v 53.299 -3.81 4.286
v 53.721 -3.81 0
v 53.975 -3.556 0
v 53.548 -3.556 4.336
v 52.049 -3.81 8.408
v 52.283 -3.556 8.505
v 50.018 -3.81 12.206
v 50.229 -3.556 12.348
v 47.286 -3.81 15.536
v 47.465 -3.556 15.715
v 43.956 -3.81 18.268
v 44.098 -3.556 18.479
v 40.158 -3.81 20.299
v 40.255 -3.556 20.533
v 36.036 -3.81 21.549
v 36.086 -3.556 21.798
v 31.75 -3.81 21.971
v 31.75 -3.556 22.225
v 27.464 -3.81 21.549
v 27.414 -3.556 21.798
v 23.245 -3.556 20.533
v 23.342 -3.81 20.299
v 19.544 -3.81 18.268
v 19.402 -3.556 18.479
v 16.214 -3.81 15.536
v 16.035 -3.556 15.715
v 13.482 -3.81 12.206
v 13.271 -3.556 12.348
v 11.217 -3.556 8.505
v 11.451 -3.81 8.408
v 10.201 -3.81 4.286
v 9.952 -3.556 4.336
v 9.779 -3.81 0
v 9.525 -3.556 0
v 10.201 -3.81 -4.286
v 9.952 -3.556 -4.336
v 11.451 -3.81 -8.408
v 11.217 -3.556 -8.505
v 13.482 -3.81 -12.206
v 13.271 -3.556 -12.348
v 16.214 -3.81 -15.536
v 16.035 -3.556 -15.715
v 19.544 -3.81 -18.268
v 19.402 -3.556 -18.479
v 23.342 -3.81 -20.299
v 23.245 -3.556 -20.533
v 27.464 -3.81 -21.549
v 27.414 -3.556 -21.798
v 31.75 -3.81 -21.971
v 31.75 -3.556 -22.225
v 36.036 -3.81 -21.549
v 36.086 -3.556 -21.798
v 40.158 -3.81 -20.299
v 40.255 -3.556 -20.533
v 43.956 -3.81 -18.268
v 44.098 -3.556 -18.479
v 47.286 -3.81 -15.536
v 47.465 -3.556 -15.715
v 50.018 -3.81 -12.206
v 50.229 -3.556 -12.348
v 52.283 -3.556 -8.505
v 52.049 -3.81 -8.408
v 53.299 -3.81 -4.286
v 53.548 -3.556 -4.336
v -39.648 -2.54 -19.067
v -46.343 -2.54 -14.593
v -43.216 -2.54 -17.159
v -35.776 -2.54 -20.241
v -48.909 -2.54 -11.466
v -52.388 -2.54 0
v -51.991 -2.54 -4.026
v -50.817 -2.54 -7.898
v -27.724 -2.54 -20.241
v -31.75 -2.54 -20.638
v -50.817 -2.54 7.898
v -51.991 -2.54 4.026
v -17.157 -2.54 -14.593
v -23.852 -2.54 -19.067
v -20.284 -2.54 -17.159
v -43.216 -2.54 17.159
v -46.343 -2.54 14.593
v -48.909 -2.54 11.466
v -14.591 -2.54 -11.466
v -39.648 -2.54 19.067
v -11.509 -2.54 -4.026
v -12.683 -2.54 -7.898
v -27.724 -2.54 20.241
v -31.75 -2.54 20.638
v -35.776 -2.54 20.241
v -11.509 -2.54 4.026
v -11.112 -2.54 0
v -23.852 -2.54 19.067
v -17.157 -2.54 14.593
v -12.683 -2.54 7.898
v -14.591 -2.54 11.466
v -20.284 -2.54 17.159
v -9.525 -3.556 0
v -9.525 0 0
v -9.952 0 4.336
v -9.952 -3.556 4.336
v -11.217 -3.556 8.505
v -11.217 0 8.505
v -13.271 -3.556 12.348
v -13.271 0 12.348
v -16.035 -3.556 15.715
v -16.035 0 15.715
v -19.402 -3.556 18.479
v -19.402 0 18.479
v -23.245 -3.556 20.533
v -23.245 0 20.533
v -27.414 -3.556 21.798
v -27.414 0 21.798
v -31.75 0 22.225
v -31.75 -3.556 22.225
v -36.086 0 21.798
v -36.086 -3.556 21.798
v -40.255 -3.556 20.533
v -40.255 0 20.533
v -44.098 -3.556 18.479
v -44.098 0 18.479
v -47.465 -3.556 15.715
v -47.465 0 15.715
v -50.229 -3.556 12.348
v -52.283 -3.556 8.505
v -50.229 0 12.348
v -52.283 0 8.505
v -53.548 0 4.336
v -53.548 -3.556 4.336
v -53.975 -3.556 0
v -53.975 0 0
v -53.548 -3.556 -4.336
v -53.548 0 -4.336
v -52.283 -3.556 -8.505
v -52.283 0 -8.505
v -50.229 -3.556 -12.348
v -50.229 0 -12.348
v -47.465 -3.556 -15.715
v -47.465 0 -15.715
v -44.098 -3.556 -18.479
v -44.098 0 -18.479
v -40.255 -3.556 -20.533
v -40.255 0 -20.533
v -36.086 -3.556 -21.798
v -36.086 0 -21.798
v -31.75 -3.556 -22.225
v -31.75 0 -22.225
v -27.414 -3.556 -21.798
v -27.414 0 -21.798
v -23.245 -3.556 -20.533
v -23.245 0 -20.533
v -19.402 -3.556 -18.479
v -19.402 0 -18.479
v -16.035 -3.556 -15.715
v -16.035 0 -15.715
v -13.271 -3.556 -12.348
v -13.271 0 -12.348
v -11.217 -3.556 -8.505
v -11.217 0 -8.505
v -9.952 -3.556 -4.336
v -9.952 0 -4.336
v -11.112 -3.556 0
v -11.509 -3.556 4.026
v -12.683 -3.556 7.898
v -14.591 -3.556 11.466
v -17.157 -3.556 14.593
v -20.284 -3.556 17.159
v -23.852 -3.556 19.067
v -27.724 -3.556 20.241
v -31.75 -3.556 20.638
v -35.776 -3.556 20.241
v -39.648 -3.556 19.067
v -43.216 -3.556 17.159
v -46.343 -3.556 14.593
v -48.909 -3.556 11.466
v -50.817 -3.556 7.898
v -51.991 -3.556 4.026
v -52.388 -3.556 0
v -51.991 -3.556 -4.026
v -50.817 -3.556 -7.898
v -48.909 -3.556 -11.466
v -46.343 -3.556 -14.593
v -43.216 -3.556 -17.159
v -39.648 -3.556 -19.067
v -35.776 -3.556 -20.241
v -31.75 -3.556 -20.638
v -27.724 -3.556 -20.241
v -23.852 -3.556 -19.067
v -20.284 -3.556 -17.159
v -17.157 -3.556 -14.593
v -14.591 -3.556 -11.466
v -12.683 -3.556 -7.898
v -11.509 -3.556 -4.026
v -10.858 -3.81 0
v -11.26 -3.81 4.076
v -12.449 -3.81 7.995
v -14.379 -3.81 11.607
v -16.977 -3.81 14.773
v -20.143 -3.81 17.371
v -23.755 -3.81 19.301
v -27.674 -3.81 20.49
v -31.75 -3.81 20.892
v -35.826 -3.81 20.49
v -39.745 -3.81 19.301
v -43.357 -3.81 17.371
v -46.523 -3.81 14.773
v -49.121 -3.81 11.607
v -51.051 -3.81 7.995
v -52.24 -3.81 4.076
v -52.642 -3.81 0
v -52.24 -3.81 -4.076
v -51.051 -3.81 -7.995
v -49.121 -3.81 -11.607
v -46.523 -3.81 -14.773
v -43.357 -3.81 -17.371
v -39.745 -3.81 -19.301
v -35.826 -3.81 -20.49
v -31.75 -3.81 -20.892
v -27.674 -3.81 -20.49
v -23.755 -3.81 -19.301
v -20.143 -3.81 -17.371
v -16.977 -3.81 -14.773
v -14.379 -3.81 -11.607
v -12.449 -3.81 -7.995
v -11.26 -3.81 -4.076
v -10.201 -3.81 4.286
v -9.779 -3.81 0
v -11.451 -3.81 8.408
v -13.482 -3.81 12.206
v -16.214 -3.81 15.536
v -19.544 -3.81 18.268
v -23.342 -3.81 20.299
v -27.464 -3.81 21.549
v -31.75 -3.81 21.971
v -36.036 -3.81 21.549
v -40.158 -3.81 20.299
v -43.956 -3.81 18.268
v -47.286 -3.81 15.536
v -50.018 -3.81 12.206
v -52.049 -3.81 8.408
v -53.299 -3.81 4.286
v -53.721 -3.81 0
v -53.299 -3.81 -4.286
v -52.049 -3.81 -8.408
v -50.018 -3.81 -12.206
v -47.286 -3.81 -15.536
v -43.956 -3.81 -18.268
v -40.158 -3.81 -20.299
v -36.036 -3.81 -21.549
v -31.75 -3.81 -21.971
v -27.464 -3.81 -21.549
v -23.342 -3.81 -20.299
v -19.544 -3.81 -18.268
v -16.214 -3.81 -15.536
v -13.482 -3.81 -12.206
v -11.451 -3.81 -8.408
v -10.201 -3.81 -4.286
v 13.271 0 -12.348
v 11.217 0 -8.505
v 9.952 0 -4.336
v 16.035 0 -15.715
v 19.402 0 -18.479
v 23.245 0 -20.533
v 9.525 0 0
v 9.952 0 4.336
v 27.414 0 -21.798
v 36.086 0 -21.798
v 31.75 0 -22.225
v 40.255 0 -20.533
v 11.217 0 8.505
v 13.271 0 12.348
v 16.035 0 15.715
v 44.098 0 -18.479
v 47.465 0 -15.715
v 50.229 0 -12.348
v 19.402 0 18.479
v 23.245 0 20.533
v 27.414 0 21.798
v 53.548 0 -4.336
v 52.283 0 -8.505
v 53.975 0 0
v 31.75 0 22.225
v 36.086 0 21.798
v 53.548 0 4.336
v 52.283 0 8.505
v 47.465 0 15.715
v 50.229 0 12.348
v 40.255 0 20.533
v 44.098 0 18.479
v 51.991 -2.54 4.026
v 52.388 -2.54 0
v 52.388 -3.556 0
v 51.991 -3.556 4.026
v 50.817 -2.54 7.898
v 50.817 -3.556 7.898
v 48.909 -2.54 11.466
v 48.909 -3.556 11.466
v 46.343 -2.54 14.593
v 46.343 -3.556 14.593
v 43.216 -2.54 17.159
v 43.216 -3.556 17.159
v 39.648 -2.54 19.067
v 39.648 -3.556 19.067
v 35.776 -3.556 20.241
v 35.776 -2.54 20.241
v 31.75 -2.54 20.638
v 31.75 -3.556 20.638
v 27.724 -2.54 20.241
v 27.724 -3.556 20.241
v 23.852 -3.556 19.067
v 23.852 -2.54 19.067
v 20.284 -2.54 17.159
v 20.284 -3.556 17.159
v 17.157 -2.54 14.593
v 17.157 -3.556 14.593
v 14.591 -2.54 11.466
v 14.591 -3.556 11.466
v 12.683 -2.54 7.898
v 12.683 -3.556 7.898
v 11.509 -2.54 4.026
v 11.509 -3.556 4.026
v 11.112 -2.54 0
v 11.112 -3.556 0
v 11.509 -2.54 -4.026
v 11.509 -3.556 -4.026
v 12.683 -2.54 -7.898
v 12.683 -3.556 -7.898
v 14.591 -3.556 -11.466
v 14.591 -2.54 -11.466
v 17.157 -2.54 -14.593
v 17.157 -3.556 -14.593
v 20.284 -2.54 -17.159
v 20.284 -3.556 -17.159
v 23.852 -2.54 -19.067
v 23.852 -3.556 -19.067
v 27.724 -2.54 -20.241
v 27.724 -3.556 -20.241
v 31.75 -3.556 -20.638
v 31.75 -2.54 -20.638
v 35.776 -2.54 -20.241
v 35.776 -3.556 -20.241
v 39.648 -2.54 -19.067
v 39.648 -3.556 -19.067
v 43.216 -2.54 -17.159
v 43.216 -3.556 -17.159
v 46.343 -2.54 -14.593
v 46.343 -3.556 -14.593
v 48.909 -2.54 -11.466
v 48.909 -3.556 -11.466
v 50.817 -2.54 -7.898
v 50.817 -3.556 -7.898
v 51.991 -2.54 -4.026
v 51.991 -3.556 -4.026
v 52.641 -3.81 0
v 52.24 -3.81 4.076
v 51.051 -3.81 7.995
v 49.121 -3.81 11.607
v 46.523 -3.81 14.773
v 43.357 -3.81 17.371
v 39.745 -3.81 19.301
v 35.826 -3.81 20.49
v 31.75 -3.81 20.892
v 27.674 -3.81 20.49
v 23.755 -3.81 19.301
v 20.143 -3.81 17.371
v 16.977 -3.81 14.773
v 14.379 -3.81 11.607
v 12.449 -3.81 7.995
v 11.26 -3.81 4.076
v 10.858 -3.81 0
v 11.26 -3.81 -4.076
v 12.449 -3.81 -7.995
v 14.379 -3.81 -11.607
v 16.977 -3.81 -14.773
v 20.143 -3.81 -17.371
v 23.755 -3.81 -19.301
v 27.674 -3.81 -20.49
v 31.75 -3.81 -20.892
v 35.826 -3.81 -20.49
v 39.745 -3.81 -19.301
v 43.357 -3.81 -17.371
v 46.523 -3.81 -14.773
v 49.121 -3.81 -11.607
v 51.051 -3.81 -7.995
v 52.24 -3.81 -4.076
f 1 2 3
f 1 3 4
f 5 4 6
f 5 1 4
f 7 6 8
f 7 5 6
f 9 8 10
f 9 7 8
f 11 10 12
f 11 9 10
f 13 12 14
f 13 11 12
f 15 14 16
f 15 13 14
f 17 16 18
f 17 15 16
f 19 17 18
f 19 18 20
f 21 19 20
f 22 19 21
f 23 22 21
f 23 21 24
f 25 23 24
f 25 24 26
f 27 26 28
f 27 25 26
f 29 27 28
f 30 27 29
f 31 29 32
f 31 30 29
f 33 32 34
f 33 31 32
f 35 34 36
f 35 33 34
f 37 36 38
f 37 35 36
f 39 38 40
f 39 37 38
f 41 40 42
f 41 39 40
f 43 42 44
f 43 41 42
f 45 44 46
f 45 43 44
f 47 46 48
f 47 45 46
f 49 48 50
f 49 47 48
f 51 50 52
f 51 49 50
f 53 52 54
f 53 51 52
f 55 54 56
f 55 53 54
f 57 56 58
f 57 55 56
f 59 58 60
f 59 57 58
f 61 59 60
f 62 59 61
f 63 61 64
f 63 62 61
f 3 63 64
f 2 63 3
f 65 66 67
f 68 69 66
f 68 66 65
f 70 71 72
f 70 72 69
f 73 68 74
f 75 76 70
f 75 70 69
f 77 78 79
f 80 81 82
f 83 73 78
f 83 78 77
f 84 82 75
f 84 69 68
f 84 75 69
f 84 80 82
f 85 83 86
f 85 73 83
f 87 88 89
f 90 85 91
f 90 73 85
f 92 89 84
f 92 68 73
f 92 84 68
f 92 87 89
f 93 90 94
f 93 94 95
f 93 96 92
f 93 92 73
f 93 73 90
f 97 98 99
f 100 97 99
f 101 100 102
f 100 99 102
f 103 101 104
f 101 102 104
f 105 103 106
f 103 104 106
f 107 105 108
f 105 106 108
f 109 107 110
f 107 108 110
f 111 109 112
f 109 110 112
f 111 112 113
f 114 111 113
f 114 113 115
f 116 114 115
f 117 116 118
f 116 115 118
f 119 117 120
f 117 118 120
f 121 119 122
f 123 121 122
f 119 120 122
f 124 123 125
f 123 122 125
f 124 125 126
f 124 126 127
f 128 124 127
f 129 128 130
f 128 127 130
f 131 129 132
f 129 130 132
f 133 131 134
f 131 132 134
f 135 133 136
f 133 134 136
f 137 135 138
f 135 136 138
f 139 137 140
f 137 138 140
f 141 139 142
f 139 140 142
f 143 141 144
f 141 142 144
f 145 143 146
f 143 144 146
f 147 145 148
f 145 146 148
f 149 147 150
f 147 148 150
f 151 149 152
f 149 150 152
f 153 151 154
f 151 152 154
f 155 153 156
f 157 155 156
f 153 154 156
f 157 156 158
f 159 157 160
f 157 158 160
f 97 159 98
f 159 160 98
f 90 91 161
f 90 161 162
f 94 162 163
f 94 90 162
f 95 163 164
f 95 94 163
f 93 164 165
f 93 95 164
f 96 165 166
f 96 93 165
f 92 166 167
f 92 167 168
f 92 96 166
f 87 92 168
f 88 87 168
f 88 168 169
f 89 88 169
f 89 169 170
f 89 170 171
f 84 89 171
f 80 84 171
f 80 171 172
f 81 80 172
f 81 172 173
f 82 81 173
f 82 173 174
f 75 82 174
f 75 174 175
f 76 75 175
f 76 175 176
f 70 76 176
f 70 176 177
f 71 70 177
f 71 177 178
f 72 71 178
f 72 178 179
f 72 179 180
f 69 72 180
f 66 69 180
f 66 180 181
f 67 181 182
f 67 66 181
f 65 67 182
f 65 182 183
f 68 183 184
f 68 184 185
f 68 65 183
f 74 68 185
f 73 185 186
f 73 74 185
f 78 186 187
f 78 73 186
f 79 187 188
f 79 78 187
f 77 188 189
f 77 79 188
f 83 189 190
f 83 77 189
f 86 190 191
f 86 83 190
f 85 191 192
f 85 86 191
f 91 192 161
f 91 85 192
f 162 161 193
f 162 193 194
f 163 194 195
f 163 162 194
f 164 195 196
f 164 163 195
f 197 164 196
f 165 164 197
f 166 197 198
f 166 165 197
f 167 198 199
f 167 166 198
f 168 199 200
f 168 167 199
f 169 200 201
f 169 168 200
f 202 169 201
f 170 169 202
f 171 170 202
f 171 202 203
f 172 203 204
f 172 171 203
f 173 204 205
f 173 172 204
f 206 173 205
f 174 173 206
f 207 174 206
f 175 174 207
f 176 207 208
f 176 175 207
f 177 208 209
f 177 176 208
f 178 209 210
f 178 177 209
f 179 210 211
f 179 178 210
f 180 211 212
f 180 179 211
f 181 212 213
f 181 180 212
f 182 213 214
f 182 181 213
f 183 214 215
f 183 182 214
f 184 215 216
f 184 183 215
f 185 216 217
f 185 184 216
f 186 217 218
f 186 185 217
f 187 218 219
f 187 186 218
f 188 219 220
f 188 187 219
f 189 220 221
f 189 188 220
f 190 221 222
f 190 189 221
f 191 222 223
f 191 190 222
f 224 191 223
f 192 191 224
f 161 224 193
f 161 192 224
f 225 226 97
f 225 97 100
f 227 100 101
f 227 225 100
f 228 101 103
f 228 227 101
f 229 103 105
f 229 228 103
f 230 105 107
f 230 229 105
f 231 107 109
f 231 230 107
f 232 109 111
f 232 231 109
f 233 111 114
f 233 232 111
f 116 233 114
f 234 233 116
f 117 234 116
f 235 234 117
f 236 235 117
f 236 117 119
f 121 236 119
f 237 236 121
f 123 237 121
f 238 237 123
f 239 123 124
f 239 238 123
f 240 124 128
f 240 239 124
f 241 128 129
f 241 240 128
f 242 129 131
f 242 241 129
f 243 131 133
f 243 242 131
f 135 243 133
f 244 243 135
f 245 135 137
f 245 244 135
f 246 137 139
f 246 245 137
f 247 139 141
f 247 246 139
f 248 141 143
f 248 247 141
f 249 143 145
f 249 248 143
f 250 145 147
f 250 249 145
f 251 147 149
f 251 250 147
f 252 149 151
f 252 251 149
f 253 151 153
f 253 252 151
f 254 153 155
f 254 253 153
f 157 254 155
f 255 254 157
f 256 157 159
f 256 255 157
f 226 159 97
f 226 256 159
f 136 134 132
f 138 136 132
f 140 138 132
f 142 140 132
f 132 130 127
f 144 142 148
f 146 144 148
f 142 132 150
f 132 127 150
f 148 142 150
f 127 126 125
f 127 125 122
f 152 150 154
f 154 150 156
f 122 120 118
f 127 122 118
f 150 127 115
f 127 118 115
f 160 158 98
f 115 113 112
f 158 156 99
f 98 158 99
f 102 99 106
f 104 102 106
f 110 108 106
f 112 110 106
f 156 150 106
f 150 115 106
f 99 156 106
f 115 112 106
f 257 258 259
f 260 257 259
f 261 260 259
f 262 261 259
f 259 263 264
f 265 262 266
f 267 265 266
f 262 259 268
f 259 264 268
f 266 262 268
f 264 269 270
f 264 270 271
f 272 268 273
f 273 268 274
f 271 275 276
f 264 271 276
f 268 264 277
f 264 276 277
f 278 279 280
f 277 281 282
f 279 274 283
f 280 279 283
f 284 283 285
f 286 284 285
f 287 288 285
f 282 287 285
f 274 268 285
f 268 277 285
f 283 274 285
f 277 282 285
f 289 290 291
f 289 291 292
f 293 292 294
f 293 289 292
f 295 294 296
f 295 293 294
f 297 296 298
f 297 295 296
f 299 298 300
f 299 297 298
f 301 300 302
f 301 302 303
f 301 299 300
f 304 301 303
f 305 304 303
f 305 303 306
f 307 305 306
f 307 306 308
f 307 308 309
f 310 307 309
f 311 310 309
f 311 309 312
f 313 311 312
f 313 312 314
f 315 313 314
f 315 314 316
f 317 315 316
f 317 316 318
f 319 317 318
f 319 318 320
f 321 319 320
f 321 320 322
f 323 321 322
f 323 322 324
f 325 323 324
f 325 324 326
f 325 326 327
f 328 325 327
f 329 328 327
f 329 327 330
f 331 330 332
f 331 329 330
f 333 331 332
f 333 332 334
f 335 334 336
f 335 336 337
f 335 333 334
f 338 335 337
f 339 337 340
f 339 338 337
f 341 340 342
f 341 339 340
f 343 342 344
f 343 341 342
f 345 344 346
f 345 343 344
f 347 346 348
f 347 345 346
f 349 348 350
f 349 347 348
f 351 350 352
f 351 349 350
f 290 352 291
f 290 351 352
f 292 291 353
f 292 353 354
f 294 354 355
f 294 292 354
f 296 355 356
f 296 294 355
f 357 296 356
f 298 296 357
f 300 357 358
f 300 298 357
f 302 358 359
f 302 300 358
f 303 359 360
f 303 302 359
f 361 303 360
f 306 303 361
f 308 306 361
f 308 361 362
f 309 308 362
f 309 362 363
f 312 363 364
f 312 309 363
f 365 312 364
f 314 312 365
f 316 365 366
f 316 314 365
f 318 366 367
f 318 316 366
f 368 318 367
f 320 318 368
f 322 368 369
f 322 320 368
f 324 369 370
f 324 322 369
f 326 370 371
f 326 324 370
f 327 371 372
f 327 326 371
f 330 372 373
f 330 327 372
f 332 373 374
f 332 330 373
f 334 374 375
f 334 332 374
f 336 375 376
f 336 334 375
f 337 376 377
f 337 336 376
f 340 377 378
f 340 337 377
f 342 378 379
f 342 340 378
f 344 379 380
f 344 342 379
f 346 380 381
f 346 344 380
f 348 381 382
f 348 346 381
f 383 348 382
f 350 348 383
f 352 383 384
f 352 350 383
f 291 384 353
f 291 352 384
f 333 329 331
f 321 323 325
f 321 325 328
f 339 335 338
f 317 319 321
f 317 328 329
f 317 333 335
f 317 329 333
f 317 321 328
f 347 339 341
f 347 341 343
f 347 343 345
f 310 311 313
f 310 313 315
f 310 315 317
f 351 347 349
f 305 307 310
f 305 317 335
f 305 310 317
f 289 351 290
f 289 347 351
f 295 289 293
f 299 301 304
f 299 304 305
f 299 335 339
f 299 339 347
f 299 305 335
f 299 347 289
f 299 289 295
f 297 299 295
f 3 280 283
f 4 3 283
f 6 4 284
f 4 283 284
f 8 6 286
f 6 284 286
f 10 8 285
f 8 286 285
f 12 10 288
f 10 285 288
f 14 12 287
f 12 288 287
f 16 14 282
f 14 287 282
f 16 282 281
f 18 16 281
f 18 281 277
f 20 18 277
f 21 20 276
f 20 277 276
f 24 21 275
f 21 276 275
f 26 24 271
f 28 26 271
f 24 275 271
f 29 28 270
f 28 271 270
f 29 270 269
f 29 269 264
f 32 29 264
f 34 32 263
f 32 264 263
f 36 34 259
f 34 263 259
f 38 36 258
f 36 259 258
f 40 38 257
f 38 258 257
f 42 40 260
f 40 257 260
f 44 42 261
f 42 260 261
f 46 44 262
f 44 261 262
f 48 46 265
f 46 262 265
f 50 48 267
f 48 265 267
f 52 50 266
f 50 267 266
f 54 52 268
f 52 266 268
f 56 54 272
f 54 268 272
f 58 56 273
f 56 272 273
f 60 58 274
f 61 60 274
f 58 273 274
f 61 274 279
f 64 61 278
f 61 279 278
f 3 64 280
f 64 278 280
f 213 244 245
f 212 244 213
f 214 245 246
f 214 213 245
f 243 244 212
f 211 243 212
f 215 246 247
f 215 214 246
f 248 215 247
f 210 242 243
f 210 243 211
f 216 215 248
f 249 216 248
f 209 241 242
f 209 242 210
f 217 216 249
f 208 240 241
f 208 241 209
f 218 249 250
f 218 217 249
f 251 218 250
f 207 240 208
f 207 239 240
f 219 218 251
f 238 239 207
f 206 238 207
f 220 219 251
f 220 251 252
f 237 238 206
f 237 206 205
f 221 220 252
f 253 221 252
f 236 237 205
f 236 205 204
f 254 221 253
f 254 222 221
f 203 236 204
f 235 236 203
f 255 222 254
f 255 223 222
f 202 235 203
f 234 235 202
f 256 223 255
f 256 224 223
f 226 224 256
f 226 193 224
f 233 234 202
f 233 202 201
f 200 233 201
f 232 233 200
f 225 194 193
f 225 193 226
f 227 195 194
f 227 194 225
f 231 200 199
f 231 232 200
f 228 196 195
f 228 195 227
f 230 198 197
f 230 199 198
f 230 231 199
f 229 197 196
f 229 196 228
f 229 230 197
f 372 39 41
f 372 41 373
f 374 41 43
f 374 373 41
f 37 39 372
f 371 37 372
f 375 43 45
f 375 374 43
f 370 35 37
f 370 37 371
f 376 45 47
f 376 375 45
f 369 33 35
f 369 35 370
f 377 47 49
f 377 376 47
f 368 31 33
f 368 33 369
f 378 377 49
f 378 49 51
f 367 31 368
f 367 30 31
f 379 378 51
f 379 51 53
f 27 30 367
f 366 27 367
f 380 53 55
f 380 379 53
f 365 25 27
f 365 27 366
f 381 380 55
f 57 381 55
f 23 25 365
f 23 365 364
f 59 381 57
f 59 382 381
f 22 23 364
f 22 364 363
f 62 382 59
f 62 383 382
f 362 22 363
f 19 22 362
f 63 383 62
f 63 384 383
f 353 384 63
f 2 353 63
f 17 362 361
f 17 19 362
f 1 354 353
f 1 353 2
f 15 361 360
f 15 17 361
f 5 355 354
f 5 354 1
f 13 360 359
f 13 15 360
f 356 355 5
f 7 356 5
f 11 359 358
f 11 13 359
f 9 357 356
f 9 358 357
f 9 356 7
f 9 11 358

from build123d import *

# Parameters (mm, degrees)
F0_R     = 20.6375
F1_DEPTH = 2.54
F0_R_2   = 22.225
F2_DEPTH = 3.81
F3_SIZE  = 0.254


with BuildPart() as f1:
    # F0 (on Front) → F1 (new body)
    with BuildSketch(Plane.XZ):
        with Locations((-31.75, 0)):
            Circle(F0_R)
        with Locations((31.75, 0)):
            Circle(F0_R)
    extrude(amount=F1_DEPTH)

    # F0 (on Front) → F2 (join)
    with BuildSketch(Plane.XZ):
        with Locations((-31.75, 0)):
            Circle(F0_R_2)
        with Locations((-31.75, 0)):
            Circle(F0_R, mode=Mode.SUBTRACT)
        with Locations((31.75, 0)):
            Circle(F0_R_2)
        with Locations((31.75, 0)):
            Circle(F0_R, mode=Mode.SUBTRACT)
    extrude(amount=F2_DEPTH)

    # F3
    f3_edges = [f1.edges().sort_by_distance(p)[0] for p in [
        (-52.3875, -3.81, 0),
        (-53.975, -3.81, 0),
        (11.1125, -3.81, 0),
        (9.525, -3.81, 0),
    ]]
    chamfer(f3_edges, length=F3_SIZE)


solid = f1.part
